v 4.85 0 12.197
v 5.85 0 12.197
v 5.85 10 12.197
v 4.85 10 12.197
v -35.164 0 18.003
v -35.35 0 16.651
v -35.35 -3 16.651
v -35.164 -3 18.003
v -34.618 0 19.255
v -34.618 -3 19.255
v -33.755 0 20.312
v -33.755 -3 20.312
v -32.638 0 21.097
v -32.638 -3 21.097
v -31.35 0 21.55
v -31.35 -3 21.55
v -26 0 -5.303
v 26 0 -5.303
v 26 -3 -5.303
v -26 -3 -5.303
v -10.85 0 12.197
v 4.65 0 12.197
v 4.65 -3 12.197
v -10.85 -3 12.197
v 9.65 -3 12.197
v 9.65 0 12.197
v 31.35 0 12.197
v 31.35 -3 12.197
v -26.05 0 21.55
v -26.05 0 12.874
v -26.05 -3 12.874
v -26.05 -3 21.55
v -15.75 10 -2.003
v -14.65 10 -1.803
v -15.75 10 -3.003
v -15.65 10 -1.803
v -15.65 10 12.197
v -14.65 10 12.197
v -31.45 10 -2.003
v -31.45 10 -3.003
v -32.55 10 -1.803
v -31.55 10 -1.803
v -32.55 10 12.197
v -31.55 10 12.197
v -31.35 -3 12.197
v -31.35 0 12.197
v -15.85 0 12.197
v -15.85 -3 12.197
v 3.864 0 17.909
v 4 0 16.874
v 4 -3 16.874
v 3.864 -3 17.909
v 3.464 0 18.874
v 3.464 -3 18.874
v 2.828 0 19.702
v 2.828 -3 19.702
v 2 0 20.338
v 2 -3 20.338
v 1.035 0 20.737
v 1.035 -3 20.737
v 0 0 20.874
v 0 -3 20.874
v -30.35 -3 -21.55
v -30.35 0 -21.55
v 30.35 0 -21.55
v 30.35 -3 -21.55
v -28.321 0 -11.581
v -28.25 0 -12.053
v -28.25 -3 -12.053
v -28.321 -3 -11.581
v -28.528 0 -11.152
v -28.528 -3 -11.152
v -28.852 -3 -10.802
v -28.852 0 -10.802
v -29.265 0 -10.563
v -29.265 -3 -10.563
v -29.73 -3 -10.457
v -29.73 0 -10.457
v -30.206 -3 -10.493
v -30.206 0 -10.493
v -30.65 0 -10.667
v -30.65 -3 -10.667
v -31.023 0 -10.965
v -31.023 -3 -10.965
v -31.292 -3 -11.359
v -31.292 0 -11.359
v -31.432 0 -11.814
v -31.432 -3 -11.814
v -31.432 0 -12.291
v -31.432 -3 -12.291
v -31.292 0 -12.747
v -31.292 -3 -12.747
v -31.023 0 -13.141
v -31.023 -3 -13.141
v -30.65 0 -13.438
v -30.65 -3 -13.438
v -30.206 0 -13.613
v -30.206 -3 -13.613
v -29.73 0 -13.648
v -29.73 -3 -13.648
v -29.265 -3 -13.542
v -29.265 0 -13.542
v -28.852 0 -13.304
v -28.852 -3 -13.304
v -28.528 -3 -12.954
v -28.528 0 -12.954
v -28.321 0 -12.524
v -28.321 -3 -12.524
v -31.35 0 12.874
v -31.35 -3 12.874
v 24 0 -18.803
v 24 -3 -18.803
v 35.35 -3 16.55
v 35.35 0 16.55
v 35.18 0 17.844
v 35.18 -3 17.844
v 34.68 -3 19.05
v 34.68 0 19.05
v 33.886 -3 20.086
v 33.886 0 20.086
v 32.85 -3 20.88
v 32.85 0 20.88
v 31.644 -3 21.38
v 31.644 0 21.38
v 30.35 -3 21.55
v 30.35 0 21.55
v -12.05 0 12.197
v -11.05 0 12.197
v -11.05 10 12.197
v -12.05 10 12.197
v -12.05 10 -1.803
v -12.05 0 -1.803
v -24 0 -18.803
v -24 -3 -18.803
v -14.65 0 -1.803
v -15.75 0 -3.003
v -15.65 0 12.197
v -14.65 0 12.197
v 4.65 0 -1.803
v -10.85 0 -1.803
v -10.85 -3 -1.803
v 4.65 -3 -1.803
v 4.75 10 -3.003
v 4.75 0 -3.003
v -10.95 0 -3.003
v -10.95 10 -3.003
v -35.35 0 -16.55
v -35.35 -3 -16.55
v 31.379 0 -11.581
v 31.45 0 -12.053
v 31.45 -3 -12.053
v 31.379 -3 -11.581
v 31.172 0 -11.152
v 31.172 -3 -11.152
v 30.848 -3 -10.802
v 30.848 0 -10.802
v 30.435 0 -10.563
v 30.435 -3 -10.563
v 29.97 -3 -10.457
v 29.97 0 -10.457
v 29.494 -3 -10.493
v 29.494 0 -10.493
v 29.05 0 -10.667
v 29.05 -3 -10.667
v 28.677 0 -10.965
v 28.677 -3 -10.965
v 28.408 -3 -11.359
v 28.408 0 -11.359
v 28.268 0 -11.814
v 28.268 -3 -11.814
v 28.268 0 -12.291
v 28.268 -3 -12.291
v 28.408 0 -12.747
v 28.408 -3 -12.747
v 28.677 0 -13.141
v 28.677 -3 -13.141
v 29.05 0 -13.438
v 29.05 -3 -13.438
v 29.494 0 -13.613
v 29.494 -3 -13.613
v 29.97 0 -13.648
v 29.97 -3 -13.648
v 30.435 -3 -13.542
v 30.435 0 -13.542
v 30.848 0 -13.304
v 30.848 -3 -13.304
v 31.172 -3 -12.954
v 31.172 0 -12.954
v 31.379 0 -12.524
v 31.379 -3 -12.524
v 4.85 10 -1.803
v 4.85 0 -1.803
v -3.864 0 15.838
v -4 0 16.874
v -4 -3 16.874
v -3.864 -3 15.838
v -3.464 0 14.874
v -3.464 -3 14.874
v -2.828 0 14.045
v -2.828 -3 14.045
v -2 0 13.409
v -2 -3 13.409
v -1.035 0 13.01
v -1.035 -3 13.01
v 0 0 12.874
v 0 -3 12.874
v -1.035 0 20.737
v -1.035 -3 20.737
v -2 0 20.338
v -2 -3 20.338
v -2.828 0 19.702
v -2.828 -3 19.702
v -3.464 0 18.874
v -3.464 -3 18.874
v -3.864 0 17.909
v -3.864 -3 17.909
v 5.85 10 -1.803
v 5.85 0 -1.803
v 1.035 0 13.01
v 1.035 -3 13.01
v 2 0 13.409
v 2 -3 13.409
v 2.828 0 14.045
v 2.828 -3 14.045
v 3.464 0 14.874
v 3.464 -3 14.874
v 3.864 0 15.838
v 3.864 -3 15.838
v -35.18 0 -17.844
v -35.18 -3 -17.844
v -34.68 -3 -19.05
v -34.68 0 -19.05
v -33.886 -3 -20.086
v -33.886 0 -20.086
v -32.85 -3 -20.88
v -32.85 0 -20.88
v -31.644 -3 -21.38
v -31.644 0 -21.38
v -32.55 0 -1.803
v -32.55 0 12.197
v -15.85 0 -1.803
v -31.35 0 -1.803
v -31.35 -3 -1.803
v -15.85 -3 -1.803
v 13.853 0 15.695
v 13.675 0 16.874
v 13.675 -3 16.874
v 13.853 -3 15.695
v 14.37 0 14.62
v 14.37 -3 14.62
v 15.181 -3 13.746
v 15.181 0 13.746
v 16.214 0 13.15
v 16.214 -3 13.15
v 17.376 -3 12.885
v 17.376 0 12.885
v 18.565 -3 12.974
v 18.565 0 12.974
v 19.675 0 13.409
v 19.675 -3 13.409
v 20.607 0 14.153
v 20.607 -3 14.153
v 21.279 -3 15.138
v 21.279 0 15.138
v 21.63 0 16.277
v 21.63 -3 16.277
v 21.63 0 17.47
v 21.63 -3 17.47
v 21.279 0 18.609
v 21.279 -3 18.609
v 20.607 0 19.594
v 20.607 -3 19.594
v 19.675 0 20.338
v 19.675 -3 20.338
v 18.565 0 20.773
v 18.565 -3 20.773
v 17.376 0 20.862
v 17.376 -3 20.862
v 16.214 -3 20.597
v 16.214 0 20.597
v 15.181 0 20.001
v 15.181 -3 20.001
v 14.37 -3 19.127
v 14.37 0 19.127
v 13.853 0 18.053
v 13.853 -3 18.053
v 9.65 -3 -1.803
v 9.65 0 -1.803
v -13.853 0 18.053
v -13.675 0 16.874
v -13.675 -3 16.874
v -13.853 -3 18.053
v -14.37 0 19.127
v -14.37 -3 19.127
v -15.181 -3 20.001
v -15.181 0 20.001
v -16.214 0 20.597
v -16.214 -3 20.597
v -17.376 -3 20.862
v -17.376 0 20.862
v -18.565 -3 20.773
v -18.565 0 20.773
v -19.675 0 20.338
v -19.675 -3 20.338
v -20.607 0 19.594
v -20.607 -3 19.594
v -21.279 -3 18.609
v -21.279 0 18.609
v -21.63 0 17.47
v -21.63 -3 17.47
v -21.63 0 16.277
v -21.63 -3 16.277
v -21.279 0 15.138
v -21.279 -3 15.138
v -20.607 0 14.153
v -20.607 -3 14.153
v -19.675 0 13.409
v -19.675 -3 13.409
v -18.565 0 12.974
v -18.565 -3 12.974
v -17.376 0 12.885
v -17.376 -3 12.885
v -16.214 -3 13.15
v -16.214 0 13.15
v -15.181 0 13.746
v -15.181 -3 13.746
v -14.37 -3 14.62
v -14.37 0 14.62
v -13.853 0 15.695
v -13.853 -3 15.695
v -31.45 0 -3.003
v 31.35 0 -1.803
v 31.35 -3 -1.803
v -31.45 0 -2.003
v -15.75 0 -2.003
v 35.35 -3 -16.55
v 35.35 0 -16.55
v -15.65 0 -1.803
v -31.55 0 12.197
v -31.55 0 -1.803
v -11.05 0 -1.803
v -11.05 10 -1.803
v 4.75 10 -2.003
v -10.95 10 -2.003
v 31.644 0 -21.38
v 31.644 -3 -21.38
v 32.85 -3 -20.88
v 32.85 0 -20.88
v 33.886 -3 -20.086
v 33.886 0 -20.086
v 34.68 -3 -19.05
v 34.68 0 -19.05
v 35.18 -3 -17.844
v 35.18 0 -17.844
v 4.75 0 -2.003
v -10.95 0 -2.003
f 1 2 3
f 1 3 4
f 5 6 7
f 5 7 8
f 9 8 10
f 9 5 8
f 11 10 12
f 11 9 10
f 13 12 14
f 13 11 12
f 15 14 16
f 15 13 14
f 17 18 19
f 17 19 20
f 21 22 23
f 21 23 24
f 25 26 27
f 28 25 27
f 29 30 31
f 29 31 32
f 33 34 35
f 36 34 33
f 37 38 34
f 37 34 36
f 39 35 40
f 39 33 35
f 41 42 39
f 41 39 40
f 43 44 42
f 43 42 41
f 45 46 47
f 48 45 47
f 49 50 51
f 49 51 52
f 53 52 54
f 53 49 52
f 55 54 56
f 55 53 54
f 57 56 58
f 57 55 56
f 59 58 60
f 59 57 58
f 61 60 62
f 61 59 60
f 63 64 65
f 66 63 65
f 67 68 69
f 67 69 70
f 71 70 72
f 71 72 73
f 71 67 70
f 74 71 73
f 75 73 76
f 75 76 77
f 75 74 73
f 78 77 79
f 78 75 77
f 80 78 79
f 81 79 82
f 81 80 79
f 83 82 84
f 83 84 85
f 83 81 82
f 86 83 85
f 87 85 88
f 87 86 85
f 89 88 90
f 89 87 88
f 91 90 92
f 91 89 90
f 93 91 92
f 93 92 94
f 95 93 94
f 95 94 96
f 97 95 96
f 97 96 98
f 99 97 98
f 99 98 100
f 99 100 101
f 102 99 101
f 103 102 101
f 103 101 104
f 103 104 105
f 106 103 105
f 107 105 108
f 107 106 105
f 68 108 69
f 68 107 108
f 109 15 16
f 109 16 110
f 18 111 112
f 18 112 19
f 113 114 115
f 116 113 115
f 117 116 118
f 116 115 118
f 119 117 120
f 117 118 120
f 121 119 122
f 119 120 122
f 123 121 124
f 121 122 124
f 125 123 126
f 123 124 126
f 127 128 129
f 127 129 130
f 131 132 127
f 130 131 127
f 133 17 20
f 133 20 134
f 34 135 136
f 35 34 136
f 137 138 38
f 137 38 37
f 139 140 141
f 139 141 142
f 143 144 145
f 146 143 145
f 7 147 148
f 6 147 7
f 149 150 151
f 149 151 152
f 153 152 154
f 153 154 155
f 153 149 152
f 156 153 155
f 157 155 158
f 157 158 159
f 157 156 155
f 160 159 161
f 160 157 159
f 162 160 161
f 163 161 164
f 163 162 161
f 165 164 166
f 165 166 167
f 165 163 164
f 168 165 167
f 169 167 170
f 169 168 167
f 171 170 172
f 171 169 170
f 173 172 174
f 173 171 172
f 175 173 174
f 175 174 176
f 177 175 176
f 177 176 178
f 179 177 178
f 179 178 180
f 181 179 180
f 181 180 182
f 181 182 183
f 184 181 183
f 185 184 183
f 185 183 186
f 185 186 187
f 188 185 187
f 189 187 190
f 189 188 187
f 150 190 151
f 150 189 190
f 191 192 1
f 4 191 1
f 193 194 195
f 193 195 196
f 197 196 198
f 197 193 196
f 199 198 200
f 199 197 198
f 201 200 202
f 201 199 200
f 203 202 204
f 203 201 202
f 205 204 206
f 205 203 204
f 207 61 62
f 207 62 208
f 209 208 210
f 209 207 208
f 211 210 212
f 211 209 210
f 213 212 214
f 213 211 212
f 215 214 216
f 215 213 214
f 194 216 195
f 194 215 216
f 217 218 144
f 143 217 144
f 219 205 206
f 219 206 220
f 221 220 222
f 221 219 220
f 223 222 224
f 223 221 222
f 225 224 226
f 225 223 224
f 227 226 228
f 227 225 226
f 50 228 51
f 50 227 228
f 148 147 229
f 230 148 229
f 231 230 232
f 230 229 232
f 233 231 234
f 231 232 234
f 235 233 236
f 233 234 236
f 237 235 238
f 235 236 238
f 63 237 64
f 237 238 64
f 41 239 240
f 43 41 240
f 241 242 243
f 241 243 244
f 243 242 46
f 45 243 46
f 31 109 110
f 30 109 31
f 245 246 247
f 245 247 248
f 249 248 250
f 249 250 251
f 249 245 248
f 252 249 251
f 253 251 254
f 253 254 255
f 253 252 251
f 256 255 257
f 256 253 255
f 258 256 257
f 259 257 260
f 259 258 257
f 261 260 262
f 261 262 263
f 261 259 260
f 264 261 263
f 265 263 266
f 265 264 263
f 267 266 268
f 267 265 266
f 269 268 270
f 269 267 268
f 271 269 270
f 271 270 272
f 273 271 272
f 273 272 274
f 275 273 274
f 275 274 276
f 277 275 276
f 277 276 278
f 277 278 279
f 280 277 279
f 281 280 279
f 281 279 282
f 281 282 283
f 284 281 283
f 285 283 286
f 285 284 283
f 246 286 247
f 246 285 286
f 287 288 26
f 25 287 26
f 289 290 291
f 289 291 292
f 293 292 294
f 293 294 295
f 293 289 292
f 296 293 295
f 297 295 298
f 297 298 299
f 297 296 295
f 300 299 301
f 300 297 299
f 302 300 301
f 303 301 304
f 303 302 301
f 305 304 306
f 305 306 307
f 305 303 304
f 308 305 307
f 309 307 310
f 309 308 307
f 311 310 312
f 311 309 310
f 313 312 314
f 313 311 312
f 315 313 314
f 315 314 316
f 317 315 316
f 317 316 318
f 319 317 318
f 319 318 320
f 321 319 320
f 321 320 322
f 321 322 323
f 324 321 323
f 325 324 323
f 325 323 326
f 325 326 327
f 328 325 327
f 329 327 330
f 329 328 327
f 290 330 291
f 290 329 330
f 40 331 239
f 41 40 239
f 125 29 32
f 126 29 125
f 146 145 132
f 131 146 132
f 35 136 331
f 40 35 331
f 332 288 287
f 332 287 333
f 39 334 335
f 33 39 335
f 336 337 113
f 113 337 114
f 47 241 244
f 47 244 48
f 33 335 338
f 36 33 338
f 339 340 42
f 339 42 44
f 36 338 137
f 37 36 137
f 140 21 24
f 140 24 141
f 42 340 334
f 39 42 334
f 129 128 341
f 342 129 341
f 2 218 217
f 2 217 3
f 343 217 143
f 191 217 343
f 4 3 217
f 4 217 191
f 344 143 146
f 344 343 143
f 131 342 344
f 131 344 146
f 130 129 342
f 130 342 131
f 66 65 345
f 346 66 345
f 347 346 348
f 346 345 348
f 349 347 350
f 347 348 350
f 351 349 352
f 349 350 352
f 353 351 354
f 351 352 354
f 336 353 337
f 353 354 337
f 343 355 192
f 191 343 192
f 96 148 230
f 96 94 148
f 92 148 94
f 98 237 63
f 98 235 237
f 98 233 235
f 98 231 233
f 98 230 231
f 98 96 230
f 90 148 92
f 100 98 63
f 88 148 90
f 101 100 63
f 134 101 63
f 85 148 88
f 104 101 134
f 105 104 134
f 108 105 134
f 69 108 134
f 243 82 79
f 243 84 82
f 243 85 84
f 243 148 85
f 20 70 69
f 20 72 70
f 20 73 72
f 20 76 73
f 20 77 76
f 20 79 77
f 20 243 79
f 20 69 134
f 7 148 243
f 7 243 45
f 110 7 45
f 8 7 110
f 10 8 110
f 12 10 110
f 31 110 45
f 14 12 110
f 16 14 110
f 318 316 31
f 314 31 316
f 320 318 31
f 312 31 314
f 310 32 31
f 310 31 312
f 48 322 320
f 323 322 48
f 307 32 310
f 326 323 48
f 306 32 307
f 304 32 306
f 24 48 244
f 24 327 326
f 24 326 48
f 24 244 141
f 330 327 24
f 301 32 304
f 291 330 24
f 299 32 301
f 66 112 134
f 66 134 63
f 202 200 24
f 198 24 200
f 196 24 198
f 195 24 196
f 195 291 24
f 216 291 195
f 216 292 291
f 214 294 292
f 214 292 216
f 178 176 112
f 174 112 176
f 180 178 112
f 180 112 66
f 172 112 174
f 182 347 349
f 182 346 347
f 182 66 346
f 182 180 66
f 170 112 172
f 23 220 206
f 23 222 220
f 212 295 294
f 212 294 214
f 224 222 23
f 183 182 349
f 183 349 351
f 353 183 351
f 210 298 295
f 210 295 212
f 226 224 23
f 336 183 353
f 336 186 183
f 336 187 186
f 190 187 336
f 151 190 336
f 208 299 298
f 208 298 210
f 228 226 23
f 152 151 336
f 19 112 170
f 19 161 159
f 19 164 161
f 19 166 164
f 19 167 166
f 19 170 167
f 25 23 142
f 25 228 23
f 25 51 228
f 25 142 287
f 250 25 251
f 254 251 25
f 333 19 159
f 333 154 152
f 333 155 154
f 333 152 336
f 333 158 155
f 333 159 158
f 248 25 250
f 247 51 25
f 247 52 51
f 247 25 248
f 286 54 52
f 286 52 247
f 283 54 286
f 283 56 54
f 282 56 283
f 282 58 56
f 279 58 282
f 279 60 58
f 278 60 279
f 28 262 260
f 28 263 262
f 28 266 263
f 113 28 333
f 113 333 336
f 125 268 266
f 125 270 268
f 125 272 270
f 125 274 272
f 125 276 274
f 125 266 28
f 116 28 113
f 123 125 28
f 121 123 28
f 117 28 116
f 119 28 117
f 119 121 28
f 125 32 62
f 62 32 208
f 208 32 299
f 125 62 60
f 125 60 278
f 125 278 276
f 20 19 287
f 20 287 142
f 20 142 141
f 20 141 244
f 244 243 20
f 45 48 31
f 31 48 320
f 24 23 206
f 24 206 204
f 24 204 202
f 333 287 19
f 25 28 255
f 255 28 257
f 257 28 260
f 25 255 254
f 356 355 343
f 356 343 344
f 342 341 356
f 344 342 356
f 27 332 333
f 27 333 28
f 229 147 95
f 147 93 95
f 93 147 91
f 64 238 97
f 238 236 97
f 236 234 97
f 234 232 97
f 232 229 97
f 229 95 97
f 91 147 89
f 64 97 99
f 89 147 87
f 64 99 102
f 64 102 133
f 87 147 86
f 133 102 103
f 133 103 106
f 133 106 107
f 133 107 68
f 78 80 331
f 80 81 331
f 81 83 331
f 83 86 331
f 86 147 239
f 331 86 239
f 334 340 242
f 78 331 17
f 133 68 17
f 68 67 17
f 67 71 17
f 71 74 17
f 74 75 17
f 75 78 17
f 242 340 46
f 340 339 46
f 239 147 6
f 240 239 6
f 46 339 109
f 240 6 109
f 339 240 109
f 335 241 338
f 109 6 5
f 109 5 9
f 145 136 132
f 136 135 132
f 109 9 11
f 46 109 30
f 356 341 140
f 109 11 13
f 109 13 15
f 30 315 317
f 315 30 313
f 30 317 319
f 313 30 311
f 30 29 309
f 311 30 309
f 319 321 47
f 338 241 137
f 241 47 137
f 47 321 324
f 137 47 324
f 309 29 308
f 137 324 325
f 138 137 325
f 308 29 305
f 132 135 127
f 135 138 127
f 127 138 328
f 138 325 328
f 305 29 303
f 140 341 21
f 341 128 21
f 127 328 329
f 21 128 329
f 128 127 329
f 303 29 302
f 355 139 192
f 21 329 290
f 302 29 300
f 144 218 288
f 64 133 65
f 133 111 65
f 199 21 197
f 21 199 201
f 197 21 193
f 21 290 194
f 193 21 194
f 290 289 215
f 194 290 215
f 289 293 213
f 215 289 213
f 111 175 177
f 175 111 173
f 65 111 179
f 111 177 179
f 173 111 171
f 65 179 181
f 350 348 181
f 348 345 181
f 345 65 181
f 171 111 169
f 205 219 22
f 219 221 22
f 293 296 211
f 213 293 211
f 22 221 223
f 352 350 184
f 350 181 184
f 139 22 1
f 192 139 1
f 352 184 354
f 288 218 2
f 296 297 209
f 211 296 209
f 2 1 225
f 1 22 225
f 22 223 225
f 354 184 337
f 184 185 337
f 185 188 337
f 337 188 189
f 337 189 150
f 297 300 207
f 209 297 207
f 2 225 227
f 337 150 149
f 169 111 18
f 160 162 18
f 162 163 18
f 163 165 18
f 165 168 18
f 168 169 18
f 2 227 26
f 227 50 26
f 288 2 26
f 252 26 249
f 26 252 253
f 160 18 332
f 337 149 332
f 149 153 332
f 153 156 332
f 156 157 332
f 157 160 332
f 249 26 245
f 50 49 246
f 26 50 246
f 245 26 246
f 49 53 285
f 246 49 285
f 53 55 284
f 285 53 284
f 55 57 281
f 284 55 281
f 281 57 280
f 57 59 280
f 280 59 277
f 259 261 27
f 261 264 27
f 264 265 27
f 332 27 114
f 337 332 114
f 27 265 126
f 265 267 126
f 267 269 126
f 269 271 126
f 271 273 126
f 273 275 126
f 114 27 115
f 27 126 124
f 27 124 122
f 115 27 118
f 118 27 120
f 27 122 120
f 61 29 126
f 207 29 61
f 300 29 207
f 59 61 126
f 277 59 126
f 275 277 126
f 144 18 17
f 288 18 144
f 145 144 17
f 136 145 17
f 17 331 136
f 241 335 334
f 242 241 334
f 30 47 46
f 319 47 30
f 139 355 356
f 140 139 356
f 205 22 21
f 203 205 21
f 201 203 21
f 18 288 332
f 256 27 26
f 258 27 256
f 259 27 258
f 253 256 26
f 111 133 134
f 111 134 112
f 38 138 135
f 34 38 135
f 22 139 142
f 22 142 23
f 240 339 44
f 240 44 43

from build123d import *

# Parameters (mm, degrees)
F0_W        = 70.7
F0_H        = 43.1
F3_DEPTH    = 3
F1_R        = 1.6
F4_DEPTH    = 3
F2_W        = 15.5
F2_H        = 14
F2_W_2      = 5.3
F2_H_2      = 4
F2_H_3      = 4.6764186437
F2_W_3      = 21.7
F5_DEPTH    = 3
F6_T1_DEPTH = 27.4948974279
F6_T3_DEPTH = 28
F7_W        = 1
F7_H        = 14
F7_H_2      = 7
F7_W_2      = 15.7
F7_H_3      = 1
F8_DEPTH    = 10


# Not quite as in the source:
# - a fillet or chamfer that OpenCascade refuses, or shapes differently, is made with other operations: its cross-section is extruded or revolved along the edge and cut away or added


with BuildPart() as f3:
    # F0 (on Front) → F3 (new body)
    with BuildSketch(Plane.XZ):
        Rectangle(F0_W, F0_H)
    extrude(amount=F3_DEPTH)

    # F1 (on face) → F4 (cut)
    with BuildSketch(Plane.XZ):
        Polygon((0, -12.0528372875), (0, -18.8028372875), (24, -18.8028372875), (26, -5.3028372875), (0, -5.3028372875), align=None)
        Polygon((-24, -18.8028372875), (0, -18.8028372875), (0, -12.0528372875), (-25, -12.0528372875), align=None)
        with Locations((-29.85, -12.0528372875)):
            Circle(F1_R)
        Polygon((-25, -12.0528372875), (0, -12.0528372875), (0, -5.3028372875), (-26, -5.3028372875), align=None)
        with Locations((29.85, -12.0528372875)):
            Circle(F1_R)
    extrude(amount=F4_DEPTH, mode=Mode.SUBTRACT)

    # F2 (on face) → F5 (cut)
    with BuildSketch(Plane.XZ):
        with Locations((-23.6, 5.1971627125)):
            Rectangle(F2_W, F2_H)
        with Locations((-28.7, 14.8735813563)):
            Rectangle(F2_W_2, F2_H_2)
        with Locations((-28.7, 19.2117906781)):
            Rectangle(F2_W_2, F2_H_3)
        with BuildLine():
            ThreePointArc((-21.675, 16.8735813563), (-17.675, 12.8735813563), (-13.675, 16.8735813563))
            Line((-13.675, 16.8735813563), (-21.675, 16.8735813563))
        make_face()
        with BuildLine():
            Line((-21.675, 16.8735813563), (-13.675, 16.8735813563))
            ThreePointArc((-13.675, 16.8735813563), (-17.675, 20.8735813563), (-21.675, 16.8735813563))
        make_face()
        with BuildLine():
            ThreePointArc((21.675, 16.8735813563), (17.675, 20.8735813563), (13.675, 16.8735813563))
            Line((13.675, 16.8735813563), (21.675, 16.8735813563))
        make_face()
        with BuildLine():
            Line((21.675, 16.8735813563), (13.675, 16.8735813563))
            ThreePointArc((13.675, 16.8735813563), (17.675, 12.8735813563), (21.675, 16.8735813563))
        make_face()
        with BuildLine():
            ThreePointArc((-4, 16.8735813563), (-2.8284271247, 14.0451542315), (0, 12.8735813563))
            Line((0, 12.8735813563), (0, 16.8735813563))
            Line((0, 16.8735813563), (-4, 16.8735813563))
        make_face()
        with BuildLine():
            Line((0, 16.8735813563), (0, 12.8735813563))
            ThreePointArc((0, 12.8735813563), (2.8284271247, 14.0451542315), (4, 16.8735813563))
            Line((4, 16.8735813563), (0, 16.8735813563))
        make_face()
        with Locations((20.5, 5.1971627125)):
            Rectangle(F2_W_3, F2_H)
        Polygon((-10.85, 12.1971627125), (-10.85, -1.8028372875), (4.65, -1.8028372875), (4.65, 12.1971627125), (0, 12.1971627125), align=None)
        with BuildLine():
            Line((-4, 16.8735813563), (0, 16.8735813563))
            Line((0, 16.8735813563), (0, 20.8735813563))
            ThreePointArc((0, 20.8735813563), (-2.8284271247, 19.702008481), (-4, 16.8735813563))
        make_face()
        with BuildLine():
            Line((0, 20.8735813563), (0, 16.8735813563))
            Line((0, 16.8735813563), (4, 16.8735813563))
            ThreePointArc((4, 16.8735813563), (2.8284271247, 19.702008481), (0, 20.8735813563))
        make_face()
    extrude(amount=F5_DEPTH, mode=Mode.SUBTRACT)

    # F6: fillet of radius 5 on 4 edges, made by hand

    # F6_s2 → F6_t1 (cut)
    with BuildSketch(Plane.XZ.offset(-12.2474487139)):
        with BuildLine():
            ThreePointArc((-35.35, 16.6510205144), (-34.2229833462, 19.8132981746), (-31.35, 21.55))
            Line((-31.35, 21.55), (-35.35, 21.55))
            Line((-35.35, 21.55), (-35.35, 16.6510205144))
        make_face()
    extrude(amount=F6_T1_DEPTH, mode=Mode.SUBTRACT)

    # F6_s4 → F6_t3 (cut)
    with BuildSketch(Plane.XZ.offset(-12.5)):
        with BuildLine():
            ThreePointArc((35.35, 16.55), (33.8855339059, 20.0855339059), (30.35, 21.55))
            Line((30.35, 21.55), (35.35, 21.55))
            Line((35.35, 21.55), (35.35, 16.55))
        make_face()
        with BuildLine():
            ThreePointArc((30.35, -21.55), (33.8855339059, -20.0855339059), (35.35, -16.55))
            Line((35.35, -16.55), (35.35, -21.55))
            Line((35.35, -21.55), (30.35, -21.55))
        make_face()
        with BuildLine():
            ThreePointArc((-35.35, -16.55), (-33.8855339059, -20.0855339059), (-30.35, -21.55))
            Line((-30.35, -21.55), (-35.35, -21.55))
            Line((-35.35, -21.55), (-35.35, -16.55))
        make_face()
    extrude(amount=F6_T3_DEPTH, mode=Mode.SUBTRACT)

    # F7 (on face) → F8 (join)
    with BuildSketch(Plane(origin=(0, 0, 0), x_dir=(-1, 0, 0), z_dir=(0, 1, 0))):
        Polygon((15.75, -2.0028372875), (15.75, -3.0028372875), (31.45, -3.0028372875), (31.45, -2.0028372875), (23.6, -2.0028372875), align=None)
        Polygon((31.45, -2.0028372875), (31.45, -3.0028372875), (32.55, -1.8028372875), (31.55, -1.8028372875), align=None)
        with Locations((32.05, 5.1971627125)):
            Rectangle(F7_W, F7_H)
        Polygon((14.65, -1.8028372875), (15.75, -3.0028372875), (15.75, -2.0028372875), (15.65, -1.8028372875), align=None)
        with Locations((15.15, 1.6971627125)):
            Rectangle(F7_W, F7_H_2)
        with Locations((15.15, 8.6971627125)):
            Rectangle(F7_W, F7_H_2)
        with Locations((3.1, -2.5028372875)):
            Rectangle(F7_W_2, F7_H_3)
        Polygon((-5.85, -1.8028372875), (-4.75, -3.0028372875), (-4.75, -2.0028372875), (-4.85, -1.8028372875), align=None)
        with Locations((-5.35, 5.1971627125)):
            Rectangle(F7_W, F7_H)
        with Locations((11.55, 1.6971627125)):
            Rectangle(F7_W, F7_H_2)
        with Locations((11.55, 8.6971627125)):
            Rectangle(F7_W, F7_H_2)
        Polygon((10.95, -3.0028372875), (12.05, -1.8028372875), (11.05, -1.8028372875), (10.95, -2.0028372875), align=None)
    extrude(amount=F8_DEPTH)


solid = f3.part
